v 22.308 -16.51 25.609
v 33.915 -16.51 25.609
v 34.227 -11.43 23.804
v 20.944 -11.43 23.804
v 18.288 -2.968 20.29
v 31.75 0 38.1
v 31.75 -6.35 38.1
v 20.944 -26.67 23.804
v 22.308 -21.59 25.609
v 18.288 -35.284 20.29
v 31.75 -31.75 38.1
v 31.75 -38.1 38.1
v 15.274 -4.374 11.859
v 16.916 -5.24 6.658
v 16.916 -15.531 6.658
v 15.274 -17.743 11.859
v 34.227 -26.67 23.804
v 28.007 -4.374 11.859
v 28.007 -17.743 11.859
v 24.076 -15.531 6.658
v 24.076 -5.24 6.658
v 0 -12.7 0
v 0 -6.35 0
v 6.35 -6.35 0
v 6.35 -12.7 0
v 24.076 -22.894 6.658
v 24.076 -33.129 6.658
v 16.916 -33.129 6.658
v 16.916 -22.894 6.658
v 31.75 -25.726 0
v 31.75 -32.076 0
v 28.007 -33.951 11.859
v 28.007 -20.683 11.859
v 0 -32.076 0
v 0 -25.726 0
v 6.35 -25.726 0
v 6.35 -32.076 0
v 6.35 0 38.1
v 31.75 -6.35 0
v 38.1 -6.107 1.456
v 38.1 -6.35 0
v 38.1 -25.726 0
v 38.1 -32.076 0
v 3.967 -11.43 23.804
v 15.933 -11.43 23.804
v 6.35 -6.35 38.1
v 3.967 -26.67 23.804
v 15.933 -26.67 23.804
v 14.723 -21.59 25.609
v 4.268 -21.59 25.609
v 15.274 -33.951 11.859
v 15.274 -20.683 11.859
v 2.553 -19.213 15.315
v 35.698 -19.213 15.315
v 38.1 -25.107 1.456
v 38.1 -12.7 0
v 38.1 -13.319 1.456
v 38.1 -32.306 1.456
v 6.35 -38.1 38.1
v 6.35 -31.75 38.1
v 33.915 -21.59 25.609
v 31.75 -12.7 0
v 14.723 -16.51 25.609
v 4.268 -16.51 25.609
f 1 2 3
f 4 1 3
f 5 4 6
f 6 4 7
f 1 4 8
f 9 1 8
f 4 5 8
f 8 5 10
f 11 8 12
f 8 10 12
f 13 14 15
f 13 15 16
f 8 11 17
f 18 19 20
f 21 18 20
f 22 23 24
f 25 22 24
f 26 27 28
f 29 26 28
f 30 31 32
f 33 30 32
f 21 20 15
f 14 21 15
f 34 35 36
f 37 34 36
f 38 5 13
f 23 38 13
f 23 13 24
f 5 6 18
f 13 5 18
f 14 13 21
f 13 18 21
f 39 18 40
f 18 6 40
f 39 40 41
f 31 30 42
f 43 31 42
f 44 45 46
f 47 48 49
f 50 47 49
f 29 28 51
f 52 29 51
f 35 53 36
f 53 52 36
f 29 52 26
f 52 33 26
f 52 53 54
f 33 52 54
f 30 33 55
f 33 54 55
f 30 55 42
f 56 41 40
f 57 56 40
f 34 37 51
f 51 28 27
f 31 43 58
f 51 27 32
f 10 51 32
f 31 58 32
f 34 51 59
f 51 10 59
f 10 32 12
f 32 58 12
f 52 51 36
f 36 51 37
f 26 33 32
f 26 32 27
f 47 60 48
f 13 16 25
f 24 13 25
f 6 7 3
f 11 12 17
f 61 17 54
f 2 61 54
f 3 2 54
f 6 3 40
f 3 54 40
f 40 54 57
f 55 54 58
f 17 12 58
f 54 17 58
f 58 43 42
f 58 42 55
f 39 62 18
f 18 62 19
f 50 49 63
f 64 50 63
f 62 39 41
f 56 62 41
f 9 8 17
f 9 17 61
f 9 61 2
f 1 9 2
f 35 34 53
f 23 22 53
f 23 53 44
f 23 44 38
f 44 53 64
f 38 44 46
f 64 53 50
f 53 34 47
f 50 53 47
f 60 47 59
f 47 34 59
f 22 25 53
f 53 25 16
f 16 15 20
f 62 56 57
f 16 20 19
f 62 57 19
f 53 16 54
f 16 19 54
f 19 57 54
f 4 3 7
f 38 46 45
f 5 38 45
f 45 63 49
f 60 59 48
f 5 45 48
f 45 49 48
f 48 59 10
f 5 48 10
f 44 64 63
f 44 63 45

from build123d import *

# Parameters (mm, degrees)
F0_W     = 38.1
F0_H     = 38.1
F1_DEPTH = 38.1
F6_DEPTH = 38.1
F8_DEPTH = 38.1


with BuildPart() as f1:
    # F0 (on Front) → F1 (new body)
    with BuildSketch(Plane.XZ):
        with Locations((19.05, 19.05)):
            Rectangle(F0_W, F0_H)
    extrude(amount=F1_DEPTH)

    # F4 (on offset) → F6 (cut)
    with BuildSketch(Plane.YZ.offset(38.1)):
        Polygon((-38.1, 38.1), (-38.1, 0), (-32.075848, 0), align=None)
        Polygon((-6.35, 38.1), (-31.75, 38.1), (-26.67, 23.803649), (-21.59, 25.608752), (-16.51, 25.608752), (-11.43, 23.803649), align=None)
        Polygon((0, 38.1), (-6.35, 0), (0, 0), align=None)
        Polygon((-19.212924, 15.315445), (-25.725848, 0), (-12.7, 0), align=None)
    extrude(amount=-F6_DEPTH, mode=Mode.SUBTRACT)

    # F7 (on offset) → F8 (cut)
    with BuildSketch(Plane.XZ.offset(38.1)):
        Polygon((0, 38.1), (0, 0), (6.35, 38.1), align=None)
        Polygon((38.1, 38.1), (31.75, 38.1), (38.1, 1.456059), align=None)
        Polygon((15.274494, 11.858941), (6.35, 0), (31.75, 0), (28.007285, 11.858941), (24.076072, 6.658068), (16.915904, 6.658068), align=None)
        Polygon((31.75, 38.1), (6.35, 38.1), (18.287822, 20.289955), align=None)
    extrude(amount=-F8_DEPTH, mode=Mode.SUBTRACT)


solid = f1.part
